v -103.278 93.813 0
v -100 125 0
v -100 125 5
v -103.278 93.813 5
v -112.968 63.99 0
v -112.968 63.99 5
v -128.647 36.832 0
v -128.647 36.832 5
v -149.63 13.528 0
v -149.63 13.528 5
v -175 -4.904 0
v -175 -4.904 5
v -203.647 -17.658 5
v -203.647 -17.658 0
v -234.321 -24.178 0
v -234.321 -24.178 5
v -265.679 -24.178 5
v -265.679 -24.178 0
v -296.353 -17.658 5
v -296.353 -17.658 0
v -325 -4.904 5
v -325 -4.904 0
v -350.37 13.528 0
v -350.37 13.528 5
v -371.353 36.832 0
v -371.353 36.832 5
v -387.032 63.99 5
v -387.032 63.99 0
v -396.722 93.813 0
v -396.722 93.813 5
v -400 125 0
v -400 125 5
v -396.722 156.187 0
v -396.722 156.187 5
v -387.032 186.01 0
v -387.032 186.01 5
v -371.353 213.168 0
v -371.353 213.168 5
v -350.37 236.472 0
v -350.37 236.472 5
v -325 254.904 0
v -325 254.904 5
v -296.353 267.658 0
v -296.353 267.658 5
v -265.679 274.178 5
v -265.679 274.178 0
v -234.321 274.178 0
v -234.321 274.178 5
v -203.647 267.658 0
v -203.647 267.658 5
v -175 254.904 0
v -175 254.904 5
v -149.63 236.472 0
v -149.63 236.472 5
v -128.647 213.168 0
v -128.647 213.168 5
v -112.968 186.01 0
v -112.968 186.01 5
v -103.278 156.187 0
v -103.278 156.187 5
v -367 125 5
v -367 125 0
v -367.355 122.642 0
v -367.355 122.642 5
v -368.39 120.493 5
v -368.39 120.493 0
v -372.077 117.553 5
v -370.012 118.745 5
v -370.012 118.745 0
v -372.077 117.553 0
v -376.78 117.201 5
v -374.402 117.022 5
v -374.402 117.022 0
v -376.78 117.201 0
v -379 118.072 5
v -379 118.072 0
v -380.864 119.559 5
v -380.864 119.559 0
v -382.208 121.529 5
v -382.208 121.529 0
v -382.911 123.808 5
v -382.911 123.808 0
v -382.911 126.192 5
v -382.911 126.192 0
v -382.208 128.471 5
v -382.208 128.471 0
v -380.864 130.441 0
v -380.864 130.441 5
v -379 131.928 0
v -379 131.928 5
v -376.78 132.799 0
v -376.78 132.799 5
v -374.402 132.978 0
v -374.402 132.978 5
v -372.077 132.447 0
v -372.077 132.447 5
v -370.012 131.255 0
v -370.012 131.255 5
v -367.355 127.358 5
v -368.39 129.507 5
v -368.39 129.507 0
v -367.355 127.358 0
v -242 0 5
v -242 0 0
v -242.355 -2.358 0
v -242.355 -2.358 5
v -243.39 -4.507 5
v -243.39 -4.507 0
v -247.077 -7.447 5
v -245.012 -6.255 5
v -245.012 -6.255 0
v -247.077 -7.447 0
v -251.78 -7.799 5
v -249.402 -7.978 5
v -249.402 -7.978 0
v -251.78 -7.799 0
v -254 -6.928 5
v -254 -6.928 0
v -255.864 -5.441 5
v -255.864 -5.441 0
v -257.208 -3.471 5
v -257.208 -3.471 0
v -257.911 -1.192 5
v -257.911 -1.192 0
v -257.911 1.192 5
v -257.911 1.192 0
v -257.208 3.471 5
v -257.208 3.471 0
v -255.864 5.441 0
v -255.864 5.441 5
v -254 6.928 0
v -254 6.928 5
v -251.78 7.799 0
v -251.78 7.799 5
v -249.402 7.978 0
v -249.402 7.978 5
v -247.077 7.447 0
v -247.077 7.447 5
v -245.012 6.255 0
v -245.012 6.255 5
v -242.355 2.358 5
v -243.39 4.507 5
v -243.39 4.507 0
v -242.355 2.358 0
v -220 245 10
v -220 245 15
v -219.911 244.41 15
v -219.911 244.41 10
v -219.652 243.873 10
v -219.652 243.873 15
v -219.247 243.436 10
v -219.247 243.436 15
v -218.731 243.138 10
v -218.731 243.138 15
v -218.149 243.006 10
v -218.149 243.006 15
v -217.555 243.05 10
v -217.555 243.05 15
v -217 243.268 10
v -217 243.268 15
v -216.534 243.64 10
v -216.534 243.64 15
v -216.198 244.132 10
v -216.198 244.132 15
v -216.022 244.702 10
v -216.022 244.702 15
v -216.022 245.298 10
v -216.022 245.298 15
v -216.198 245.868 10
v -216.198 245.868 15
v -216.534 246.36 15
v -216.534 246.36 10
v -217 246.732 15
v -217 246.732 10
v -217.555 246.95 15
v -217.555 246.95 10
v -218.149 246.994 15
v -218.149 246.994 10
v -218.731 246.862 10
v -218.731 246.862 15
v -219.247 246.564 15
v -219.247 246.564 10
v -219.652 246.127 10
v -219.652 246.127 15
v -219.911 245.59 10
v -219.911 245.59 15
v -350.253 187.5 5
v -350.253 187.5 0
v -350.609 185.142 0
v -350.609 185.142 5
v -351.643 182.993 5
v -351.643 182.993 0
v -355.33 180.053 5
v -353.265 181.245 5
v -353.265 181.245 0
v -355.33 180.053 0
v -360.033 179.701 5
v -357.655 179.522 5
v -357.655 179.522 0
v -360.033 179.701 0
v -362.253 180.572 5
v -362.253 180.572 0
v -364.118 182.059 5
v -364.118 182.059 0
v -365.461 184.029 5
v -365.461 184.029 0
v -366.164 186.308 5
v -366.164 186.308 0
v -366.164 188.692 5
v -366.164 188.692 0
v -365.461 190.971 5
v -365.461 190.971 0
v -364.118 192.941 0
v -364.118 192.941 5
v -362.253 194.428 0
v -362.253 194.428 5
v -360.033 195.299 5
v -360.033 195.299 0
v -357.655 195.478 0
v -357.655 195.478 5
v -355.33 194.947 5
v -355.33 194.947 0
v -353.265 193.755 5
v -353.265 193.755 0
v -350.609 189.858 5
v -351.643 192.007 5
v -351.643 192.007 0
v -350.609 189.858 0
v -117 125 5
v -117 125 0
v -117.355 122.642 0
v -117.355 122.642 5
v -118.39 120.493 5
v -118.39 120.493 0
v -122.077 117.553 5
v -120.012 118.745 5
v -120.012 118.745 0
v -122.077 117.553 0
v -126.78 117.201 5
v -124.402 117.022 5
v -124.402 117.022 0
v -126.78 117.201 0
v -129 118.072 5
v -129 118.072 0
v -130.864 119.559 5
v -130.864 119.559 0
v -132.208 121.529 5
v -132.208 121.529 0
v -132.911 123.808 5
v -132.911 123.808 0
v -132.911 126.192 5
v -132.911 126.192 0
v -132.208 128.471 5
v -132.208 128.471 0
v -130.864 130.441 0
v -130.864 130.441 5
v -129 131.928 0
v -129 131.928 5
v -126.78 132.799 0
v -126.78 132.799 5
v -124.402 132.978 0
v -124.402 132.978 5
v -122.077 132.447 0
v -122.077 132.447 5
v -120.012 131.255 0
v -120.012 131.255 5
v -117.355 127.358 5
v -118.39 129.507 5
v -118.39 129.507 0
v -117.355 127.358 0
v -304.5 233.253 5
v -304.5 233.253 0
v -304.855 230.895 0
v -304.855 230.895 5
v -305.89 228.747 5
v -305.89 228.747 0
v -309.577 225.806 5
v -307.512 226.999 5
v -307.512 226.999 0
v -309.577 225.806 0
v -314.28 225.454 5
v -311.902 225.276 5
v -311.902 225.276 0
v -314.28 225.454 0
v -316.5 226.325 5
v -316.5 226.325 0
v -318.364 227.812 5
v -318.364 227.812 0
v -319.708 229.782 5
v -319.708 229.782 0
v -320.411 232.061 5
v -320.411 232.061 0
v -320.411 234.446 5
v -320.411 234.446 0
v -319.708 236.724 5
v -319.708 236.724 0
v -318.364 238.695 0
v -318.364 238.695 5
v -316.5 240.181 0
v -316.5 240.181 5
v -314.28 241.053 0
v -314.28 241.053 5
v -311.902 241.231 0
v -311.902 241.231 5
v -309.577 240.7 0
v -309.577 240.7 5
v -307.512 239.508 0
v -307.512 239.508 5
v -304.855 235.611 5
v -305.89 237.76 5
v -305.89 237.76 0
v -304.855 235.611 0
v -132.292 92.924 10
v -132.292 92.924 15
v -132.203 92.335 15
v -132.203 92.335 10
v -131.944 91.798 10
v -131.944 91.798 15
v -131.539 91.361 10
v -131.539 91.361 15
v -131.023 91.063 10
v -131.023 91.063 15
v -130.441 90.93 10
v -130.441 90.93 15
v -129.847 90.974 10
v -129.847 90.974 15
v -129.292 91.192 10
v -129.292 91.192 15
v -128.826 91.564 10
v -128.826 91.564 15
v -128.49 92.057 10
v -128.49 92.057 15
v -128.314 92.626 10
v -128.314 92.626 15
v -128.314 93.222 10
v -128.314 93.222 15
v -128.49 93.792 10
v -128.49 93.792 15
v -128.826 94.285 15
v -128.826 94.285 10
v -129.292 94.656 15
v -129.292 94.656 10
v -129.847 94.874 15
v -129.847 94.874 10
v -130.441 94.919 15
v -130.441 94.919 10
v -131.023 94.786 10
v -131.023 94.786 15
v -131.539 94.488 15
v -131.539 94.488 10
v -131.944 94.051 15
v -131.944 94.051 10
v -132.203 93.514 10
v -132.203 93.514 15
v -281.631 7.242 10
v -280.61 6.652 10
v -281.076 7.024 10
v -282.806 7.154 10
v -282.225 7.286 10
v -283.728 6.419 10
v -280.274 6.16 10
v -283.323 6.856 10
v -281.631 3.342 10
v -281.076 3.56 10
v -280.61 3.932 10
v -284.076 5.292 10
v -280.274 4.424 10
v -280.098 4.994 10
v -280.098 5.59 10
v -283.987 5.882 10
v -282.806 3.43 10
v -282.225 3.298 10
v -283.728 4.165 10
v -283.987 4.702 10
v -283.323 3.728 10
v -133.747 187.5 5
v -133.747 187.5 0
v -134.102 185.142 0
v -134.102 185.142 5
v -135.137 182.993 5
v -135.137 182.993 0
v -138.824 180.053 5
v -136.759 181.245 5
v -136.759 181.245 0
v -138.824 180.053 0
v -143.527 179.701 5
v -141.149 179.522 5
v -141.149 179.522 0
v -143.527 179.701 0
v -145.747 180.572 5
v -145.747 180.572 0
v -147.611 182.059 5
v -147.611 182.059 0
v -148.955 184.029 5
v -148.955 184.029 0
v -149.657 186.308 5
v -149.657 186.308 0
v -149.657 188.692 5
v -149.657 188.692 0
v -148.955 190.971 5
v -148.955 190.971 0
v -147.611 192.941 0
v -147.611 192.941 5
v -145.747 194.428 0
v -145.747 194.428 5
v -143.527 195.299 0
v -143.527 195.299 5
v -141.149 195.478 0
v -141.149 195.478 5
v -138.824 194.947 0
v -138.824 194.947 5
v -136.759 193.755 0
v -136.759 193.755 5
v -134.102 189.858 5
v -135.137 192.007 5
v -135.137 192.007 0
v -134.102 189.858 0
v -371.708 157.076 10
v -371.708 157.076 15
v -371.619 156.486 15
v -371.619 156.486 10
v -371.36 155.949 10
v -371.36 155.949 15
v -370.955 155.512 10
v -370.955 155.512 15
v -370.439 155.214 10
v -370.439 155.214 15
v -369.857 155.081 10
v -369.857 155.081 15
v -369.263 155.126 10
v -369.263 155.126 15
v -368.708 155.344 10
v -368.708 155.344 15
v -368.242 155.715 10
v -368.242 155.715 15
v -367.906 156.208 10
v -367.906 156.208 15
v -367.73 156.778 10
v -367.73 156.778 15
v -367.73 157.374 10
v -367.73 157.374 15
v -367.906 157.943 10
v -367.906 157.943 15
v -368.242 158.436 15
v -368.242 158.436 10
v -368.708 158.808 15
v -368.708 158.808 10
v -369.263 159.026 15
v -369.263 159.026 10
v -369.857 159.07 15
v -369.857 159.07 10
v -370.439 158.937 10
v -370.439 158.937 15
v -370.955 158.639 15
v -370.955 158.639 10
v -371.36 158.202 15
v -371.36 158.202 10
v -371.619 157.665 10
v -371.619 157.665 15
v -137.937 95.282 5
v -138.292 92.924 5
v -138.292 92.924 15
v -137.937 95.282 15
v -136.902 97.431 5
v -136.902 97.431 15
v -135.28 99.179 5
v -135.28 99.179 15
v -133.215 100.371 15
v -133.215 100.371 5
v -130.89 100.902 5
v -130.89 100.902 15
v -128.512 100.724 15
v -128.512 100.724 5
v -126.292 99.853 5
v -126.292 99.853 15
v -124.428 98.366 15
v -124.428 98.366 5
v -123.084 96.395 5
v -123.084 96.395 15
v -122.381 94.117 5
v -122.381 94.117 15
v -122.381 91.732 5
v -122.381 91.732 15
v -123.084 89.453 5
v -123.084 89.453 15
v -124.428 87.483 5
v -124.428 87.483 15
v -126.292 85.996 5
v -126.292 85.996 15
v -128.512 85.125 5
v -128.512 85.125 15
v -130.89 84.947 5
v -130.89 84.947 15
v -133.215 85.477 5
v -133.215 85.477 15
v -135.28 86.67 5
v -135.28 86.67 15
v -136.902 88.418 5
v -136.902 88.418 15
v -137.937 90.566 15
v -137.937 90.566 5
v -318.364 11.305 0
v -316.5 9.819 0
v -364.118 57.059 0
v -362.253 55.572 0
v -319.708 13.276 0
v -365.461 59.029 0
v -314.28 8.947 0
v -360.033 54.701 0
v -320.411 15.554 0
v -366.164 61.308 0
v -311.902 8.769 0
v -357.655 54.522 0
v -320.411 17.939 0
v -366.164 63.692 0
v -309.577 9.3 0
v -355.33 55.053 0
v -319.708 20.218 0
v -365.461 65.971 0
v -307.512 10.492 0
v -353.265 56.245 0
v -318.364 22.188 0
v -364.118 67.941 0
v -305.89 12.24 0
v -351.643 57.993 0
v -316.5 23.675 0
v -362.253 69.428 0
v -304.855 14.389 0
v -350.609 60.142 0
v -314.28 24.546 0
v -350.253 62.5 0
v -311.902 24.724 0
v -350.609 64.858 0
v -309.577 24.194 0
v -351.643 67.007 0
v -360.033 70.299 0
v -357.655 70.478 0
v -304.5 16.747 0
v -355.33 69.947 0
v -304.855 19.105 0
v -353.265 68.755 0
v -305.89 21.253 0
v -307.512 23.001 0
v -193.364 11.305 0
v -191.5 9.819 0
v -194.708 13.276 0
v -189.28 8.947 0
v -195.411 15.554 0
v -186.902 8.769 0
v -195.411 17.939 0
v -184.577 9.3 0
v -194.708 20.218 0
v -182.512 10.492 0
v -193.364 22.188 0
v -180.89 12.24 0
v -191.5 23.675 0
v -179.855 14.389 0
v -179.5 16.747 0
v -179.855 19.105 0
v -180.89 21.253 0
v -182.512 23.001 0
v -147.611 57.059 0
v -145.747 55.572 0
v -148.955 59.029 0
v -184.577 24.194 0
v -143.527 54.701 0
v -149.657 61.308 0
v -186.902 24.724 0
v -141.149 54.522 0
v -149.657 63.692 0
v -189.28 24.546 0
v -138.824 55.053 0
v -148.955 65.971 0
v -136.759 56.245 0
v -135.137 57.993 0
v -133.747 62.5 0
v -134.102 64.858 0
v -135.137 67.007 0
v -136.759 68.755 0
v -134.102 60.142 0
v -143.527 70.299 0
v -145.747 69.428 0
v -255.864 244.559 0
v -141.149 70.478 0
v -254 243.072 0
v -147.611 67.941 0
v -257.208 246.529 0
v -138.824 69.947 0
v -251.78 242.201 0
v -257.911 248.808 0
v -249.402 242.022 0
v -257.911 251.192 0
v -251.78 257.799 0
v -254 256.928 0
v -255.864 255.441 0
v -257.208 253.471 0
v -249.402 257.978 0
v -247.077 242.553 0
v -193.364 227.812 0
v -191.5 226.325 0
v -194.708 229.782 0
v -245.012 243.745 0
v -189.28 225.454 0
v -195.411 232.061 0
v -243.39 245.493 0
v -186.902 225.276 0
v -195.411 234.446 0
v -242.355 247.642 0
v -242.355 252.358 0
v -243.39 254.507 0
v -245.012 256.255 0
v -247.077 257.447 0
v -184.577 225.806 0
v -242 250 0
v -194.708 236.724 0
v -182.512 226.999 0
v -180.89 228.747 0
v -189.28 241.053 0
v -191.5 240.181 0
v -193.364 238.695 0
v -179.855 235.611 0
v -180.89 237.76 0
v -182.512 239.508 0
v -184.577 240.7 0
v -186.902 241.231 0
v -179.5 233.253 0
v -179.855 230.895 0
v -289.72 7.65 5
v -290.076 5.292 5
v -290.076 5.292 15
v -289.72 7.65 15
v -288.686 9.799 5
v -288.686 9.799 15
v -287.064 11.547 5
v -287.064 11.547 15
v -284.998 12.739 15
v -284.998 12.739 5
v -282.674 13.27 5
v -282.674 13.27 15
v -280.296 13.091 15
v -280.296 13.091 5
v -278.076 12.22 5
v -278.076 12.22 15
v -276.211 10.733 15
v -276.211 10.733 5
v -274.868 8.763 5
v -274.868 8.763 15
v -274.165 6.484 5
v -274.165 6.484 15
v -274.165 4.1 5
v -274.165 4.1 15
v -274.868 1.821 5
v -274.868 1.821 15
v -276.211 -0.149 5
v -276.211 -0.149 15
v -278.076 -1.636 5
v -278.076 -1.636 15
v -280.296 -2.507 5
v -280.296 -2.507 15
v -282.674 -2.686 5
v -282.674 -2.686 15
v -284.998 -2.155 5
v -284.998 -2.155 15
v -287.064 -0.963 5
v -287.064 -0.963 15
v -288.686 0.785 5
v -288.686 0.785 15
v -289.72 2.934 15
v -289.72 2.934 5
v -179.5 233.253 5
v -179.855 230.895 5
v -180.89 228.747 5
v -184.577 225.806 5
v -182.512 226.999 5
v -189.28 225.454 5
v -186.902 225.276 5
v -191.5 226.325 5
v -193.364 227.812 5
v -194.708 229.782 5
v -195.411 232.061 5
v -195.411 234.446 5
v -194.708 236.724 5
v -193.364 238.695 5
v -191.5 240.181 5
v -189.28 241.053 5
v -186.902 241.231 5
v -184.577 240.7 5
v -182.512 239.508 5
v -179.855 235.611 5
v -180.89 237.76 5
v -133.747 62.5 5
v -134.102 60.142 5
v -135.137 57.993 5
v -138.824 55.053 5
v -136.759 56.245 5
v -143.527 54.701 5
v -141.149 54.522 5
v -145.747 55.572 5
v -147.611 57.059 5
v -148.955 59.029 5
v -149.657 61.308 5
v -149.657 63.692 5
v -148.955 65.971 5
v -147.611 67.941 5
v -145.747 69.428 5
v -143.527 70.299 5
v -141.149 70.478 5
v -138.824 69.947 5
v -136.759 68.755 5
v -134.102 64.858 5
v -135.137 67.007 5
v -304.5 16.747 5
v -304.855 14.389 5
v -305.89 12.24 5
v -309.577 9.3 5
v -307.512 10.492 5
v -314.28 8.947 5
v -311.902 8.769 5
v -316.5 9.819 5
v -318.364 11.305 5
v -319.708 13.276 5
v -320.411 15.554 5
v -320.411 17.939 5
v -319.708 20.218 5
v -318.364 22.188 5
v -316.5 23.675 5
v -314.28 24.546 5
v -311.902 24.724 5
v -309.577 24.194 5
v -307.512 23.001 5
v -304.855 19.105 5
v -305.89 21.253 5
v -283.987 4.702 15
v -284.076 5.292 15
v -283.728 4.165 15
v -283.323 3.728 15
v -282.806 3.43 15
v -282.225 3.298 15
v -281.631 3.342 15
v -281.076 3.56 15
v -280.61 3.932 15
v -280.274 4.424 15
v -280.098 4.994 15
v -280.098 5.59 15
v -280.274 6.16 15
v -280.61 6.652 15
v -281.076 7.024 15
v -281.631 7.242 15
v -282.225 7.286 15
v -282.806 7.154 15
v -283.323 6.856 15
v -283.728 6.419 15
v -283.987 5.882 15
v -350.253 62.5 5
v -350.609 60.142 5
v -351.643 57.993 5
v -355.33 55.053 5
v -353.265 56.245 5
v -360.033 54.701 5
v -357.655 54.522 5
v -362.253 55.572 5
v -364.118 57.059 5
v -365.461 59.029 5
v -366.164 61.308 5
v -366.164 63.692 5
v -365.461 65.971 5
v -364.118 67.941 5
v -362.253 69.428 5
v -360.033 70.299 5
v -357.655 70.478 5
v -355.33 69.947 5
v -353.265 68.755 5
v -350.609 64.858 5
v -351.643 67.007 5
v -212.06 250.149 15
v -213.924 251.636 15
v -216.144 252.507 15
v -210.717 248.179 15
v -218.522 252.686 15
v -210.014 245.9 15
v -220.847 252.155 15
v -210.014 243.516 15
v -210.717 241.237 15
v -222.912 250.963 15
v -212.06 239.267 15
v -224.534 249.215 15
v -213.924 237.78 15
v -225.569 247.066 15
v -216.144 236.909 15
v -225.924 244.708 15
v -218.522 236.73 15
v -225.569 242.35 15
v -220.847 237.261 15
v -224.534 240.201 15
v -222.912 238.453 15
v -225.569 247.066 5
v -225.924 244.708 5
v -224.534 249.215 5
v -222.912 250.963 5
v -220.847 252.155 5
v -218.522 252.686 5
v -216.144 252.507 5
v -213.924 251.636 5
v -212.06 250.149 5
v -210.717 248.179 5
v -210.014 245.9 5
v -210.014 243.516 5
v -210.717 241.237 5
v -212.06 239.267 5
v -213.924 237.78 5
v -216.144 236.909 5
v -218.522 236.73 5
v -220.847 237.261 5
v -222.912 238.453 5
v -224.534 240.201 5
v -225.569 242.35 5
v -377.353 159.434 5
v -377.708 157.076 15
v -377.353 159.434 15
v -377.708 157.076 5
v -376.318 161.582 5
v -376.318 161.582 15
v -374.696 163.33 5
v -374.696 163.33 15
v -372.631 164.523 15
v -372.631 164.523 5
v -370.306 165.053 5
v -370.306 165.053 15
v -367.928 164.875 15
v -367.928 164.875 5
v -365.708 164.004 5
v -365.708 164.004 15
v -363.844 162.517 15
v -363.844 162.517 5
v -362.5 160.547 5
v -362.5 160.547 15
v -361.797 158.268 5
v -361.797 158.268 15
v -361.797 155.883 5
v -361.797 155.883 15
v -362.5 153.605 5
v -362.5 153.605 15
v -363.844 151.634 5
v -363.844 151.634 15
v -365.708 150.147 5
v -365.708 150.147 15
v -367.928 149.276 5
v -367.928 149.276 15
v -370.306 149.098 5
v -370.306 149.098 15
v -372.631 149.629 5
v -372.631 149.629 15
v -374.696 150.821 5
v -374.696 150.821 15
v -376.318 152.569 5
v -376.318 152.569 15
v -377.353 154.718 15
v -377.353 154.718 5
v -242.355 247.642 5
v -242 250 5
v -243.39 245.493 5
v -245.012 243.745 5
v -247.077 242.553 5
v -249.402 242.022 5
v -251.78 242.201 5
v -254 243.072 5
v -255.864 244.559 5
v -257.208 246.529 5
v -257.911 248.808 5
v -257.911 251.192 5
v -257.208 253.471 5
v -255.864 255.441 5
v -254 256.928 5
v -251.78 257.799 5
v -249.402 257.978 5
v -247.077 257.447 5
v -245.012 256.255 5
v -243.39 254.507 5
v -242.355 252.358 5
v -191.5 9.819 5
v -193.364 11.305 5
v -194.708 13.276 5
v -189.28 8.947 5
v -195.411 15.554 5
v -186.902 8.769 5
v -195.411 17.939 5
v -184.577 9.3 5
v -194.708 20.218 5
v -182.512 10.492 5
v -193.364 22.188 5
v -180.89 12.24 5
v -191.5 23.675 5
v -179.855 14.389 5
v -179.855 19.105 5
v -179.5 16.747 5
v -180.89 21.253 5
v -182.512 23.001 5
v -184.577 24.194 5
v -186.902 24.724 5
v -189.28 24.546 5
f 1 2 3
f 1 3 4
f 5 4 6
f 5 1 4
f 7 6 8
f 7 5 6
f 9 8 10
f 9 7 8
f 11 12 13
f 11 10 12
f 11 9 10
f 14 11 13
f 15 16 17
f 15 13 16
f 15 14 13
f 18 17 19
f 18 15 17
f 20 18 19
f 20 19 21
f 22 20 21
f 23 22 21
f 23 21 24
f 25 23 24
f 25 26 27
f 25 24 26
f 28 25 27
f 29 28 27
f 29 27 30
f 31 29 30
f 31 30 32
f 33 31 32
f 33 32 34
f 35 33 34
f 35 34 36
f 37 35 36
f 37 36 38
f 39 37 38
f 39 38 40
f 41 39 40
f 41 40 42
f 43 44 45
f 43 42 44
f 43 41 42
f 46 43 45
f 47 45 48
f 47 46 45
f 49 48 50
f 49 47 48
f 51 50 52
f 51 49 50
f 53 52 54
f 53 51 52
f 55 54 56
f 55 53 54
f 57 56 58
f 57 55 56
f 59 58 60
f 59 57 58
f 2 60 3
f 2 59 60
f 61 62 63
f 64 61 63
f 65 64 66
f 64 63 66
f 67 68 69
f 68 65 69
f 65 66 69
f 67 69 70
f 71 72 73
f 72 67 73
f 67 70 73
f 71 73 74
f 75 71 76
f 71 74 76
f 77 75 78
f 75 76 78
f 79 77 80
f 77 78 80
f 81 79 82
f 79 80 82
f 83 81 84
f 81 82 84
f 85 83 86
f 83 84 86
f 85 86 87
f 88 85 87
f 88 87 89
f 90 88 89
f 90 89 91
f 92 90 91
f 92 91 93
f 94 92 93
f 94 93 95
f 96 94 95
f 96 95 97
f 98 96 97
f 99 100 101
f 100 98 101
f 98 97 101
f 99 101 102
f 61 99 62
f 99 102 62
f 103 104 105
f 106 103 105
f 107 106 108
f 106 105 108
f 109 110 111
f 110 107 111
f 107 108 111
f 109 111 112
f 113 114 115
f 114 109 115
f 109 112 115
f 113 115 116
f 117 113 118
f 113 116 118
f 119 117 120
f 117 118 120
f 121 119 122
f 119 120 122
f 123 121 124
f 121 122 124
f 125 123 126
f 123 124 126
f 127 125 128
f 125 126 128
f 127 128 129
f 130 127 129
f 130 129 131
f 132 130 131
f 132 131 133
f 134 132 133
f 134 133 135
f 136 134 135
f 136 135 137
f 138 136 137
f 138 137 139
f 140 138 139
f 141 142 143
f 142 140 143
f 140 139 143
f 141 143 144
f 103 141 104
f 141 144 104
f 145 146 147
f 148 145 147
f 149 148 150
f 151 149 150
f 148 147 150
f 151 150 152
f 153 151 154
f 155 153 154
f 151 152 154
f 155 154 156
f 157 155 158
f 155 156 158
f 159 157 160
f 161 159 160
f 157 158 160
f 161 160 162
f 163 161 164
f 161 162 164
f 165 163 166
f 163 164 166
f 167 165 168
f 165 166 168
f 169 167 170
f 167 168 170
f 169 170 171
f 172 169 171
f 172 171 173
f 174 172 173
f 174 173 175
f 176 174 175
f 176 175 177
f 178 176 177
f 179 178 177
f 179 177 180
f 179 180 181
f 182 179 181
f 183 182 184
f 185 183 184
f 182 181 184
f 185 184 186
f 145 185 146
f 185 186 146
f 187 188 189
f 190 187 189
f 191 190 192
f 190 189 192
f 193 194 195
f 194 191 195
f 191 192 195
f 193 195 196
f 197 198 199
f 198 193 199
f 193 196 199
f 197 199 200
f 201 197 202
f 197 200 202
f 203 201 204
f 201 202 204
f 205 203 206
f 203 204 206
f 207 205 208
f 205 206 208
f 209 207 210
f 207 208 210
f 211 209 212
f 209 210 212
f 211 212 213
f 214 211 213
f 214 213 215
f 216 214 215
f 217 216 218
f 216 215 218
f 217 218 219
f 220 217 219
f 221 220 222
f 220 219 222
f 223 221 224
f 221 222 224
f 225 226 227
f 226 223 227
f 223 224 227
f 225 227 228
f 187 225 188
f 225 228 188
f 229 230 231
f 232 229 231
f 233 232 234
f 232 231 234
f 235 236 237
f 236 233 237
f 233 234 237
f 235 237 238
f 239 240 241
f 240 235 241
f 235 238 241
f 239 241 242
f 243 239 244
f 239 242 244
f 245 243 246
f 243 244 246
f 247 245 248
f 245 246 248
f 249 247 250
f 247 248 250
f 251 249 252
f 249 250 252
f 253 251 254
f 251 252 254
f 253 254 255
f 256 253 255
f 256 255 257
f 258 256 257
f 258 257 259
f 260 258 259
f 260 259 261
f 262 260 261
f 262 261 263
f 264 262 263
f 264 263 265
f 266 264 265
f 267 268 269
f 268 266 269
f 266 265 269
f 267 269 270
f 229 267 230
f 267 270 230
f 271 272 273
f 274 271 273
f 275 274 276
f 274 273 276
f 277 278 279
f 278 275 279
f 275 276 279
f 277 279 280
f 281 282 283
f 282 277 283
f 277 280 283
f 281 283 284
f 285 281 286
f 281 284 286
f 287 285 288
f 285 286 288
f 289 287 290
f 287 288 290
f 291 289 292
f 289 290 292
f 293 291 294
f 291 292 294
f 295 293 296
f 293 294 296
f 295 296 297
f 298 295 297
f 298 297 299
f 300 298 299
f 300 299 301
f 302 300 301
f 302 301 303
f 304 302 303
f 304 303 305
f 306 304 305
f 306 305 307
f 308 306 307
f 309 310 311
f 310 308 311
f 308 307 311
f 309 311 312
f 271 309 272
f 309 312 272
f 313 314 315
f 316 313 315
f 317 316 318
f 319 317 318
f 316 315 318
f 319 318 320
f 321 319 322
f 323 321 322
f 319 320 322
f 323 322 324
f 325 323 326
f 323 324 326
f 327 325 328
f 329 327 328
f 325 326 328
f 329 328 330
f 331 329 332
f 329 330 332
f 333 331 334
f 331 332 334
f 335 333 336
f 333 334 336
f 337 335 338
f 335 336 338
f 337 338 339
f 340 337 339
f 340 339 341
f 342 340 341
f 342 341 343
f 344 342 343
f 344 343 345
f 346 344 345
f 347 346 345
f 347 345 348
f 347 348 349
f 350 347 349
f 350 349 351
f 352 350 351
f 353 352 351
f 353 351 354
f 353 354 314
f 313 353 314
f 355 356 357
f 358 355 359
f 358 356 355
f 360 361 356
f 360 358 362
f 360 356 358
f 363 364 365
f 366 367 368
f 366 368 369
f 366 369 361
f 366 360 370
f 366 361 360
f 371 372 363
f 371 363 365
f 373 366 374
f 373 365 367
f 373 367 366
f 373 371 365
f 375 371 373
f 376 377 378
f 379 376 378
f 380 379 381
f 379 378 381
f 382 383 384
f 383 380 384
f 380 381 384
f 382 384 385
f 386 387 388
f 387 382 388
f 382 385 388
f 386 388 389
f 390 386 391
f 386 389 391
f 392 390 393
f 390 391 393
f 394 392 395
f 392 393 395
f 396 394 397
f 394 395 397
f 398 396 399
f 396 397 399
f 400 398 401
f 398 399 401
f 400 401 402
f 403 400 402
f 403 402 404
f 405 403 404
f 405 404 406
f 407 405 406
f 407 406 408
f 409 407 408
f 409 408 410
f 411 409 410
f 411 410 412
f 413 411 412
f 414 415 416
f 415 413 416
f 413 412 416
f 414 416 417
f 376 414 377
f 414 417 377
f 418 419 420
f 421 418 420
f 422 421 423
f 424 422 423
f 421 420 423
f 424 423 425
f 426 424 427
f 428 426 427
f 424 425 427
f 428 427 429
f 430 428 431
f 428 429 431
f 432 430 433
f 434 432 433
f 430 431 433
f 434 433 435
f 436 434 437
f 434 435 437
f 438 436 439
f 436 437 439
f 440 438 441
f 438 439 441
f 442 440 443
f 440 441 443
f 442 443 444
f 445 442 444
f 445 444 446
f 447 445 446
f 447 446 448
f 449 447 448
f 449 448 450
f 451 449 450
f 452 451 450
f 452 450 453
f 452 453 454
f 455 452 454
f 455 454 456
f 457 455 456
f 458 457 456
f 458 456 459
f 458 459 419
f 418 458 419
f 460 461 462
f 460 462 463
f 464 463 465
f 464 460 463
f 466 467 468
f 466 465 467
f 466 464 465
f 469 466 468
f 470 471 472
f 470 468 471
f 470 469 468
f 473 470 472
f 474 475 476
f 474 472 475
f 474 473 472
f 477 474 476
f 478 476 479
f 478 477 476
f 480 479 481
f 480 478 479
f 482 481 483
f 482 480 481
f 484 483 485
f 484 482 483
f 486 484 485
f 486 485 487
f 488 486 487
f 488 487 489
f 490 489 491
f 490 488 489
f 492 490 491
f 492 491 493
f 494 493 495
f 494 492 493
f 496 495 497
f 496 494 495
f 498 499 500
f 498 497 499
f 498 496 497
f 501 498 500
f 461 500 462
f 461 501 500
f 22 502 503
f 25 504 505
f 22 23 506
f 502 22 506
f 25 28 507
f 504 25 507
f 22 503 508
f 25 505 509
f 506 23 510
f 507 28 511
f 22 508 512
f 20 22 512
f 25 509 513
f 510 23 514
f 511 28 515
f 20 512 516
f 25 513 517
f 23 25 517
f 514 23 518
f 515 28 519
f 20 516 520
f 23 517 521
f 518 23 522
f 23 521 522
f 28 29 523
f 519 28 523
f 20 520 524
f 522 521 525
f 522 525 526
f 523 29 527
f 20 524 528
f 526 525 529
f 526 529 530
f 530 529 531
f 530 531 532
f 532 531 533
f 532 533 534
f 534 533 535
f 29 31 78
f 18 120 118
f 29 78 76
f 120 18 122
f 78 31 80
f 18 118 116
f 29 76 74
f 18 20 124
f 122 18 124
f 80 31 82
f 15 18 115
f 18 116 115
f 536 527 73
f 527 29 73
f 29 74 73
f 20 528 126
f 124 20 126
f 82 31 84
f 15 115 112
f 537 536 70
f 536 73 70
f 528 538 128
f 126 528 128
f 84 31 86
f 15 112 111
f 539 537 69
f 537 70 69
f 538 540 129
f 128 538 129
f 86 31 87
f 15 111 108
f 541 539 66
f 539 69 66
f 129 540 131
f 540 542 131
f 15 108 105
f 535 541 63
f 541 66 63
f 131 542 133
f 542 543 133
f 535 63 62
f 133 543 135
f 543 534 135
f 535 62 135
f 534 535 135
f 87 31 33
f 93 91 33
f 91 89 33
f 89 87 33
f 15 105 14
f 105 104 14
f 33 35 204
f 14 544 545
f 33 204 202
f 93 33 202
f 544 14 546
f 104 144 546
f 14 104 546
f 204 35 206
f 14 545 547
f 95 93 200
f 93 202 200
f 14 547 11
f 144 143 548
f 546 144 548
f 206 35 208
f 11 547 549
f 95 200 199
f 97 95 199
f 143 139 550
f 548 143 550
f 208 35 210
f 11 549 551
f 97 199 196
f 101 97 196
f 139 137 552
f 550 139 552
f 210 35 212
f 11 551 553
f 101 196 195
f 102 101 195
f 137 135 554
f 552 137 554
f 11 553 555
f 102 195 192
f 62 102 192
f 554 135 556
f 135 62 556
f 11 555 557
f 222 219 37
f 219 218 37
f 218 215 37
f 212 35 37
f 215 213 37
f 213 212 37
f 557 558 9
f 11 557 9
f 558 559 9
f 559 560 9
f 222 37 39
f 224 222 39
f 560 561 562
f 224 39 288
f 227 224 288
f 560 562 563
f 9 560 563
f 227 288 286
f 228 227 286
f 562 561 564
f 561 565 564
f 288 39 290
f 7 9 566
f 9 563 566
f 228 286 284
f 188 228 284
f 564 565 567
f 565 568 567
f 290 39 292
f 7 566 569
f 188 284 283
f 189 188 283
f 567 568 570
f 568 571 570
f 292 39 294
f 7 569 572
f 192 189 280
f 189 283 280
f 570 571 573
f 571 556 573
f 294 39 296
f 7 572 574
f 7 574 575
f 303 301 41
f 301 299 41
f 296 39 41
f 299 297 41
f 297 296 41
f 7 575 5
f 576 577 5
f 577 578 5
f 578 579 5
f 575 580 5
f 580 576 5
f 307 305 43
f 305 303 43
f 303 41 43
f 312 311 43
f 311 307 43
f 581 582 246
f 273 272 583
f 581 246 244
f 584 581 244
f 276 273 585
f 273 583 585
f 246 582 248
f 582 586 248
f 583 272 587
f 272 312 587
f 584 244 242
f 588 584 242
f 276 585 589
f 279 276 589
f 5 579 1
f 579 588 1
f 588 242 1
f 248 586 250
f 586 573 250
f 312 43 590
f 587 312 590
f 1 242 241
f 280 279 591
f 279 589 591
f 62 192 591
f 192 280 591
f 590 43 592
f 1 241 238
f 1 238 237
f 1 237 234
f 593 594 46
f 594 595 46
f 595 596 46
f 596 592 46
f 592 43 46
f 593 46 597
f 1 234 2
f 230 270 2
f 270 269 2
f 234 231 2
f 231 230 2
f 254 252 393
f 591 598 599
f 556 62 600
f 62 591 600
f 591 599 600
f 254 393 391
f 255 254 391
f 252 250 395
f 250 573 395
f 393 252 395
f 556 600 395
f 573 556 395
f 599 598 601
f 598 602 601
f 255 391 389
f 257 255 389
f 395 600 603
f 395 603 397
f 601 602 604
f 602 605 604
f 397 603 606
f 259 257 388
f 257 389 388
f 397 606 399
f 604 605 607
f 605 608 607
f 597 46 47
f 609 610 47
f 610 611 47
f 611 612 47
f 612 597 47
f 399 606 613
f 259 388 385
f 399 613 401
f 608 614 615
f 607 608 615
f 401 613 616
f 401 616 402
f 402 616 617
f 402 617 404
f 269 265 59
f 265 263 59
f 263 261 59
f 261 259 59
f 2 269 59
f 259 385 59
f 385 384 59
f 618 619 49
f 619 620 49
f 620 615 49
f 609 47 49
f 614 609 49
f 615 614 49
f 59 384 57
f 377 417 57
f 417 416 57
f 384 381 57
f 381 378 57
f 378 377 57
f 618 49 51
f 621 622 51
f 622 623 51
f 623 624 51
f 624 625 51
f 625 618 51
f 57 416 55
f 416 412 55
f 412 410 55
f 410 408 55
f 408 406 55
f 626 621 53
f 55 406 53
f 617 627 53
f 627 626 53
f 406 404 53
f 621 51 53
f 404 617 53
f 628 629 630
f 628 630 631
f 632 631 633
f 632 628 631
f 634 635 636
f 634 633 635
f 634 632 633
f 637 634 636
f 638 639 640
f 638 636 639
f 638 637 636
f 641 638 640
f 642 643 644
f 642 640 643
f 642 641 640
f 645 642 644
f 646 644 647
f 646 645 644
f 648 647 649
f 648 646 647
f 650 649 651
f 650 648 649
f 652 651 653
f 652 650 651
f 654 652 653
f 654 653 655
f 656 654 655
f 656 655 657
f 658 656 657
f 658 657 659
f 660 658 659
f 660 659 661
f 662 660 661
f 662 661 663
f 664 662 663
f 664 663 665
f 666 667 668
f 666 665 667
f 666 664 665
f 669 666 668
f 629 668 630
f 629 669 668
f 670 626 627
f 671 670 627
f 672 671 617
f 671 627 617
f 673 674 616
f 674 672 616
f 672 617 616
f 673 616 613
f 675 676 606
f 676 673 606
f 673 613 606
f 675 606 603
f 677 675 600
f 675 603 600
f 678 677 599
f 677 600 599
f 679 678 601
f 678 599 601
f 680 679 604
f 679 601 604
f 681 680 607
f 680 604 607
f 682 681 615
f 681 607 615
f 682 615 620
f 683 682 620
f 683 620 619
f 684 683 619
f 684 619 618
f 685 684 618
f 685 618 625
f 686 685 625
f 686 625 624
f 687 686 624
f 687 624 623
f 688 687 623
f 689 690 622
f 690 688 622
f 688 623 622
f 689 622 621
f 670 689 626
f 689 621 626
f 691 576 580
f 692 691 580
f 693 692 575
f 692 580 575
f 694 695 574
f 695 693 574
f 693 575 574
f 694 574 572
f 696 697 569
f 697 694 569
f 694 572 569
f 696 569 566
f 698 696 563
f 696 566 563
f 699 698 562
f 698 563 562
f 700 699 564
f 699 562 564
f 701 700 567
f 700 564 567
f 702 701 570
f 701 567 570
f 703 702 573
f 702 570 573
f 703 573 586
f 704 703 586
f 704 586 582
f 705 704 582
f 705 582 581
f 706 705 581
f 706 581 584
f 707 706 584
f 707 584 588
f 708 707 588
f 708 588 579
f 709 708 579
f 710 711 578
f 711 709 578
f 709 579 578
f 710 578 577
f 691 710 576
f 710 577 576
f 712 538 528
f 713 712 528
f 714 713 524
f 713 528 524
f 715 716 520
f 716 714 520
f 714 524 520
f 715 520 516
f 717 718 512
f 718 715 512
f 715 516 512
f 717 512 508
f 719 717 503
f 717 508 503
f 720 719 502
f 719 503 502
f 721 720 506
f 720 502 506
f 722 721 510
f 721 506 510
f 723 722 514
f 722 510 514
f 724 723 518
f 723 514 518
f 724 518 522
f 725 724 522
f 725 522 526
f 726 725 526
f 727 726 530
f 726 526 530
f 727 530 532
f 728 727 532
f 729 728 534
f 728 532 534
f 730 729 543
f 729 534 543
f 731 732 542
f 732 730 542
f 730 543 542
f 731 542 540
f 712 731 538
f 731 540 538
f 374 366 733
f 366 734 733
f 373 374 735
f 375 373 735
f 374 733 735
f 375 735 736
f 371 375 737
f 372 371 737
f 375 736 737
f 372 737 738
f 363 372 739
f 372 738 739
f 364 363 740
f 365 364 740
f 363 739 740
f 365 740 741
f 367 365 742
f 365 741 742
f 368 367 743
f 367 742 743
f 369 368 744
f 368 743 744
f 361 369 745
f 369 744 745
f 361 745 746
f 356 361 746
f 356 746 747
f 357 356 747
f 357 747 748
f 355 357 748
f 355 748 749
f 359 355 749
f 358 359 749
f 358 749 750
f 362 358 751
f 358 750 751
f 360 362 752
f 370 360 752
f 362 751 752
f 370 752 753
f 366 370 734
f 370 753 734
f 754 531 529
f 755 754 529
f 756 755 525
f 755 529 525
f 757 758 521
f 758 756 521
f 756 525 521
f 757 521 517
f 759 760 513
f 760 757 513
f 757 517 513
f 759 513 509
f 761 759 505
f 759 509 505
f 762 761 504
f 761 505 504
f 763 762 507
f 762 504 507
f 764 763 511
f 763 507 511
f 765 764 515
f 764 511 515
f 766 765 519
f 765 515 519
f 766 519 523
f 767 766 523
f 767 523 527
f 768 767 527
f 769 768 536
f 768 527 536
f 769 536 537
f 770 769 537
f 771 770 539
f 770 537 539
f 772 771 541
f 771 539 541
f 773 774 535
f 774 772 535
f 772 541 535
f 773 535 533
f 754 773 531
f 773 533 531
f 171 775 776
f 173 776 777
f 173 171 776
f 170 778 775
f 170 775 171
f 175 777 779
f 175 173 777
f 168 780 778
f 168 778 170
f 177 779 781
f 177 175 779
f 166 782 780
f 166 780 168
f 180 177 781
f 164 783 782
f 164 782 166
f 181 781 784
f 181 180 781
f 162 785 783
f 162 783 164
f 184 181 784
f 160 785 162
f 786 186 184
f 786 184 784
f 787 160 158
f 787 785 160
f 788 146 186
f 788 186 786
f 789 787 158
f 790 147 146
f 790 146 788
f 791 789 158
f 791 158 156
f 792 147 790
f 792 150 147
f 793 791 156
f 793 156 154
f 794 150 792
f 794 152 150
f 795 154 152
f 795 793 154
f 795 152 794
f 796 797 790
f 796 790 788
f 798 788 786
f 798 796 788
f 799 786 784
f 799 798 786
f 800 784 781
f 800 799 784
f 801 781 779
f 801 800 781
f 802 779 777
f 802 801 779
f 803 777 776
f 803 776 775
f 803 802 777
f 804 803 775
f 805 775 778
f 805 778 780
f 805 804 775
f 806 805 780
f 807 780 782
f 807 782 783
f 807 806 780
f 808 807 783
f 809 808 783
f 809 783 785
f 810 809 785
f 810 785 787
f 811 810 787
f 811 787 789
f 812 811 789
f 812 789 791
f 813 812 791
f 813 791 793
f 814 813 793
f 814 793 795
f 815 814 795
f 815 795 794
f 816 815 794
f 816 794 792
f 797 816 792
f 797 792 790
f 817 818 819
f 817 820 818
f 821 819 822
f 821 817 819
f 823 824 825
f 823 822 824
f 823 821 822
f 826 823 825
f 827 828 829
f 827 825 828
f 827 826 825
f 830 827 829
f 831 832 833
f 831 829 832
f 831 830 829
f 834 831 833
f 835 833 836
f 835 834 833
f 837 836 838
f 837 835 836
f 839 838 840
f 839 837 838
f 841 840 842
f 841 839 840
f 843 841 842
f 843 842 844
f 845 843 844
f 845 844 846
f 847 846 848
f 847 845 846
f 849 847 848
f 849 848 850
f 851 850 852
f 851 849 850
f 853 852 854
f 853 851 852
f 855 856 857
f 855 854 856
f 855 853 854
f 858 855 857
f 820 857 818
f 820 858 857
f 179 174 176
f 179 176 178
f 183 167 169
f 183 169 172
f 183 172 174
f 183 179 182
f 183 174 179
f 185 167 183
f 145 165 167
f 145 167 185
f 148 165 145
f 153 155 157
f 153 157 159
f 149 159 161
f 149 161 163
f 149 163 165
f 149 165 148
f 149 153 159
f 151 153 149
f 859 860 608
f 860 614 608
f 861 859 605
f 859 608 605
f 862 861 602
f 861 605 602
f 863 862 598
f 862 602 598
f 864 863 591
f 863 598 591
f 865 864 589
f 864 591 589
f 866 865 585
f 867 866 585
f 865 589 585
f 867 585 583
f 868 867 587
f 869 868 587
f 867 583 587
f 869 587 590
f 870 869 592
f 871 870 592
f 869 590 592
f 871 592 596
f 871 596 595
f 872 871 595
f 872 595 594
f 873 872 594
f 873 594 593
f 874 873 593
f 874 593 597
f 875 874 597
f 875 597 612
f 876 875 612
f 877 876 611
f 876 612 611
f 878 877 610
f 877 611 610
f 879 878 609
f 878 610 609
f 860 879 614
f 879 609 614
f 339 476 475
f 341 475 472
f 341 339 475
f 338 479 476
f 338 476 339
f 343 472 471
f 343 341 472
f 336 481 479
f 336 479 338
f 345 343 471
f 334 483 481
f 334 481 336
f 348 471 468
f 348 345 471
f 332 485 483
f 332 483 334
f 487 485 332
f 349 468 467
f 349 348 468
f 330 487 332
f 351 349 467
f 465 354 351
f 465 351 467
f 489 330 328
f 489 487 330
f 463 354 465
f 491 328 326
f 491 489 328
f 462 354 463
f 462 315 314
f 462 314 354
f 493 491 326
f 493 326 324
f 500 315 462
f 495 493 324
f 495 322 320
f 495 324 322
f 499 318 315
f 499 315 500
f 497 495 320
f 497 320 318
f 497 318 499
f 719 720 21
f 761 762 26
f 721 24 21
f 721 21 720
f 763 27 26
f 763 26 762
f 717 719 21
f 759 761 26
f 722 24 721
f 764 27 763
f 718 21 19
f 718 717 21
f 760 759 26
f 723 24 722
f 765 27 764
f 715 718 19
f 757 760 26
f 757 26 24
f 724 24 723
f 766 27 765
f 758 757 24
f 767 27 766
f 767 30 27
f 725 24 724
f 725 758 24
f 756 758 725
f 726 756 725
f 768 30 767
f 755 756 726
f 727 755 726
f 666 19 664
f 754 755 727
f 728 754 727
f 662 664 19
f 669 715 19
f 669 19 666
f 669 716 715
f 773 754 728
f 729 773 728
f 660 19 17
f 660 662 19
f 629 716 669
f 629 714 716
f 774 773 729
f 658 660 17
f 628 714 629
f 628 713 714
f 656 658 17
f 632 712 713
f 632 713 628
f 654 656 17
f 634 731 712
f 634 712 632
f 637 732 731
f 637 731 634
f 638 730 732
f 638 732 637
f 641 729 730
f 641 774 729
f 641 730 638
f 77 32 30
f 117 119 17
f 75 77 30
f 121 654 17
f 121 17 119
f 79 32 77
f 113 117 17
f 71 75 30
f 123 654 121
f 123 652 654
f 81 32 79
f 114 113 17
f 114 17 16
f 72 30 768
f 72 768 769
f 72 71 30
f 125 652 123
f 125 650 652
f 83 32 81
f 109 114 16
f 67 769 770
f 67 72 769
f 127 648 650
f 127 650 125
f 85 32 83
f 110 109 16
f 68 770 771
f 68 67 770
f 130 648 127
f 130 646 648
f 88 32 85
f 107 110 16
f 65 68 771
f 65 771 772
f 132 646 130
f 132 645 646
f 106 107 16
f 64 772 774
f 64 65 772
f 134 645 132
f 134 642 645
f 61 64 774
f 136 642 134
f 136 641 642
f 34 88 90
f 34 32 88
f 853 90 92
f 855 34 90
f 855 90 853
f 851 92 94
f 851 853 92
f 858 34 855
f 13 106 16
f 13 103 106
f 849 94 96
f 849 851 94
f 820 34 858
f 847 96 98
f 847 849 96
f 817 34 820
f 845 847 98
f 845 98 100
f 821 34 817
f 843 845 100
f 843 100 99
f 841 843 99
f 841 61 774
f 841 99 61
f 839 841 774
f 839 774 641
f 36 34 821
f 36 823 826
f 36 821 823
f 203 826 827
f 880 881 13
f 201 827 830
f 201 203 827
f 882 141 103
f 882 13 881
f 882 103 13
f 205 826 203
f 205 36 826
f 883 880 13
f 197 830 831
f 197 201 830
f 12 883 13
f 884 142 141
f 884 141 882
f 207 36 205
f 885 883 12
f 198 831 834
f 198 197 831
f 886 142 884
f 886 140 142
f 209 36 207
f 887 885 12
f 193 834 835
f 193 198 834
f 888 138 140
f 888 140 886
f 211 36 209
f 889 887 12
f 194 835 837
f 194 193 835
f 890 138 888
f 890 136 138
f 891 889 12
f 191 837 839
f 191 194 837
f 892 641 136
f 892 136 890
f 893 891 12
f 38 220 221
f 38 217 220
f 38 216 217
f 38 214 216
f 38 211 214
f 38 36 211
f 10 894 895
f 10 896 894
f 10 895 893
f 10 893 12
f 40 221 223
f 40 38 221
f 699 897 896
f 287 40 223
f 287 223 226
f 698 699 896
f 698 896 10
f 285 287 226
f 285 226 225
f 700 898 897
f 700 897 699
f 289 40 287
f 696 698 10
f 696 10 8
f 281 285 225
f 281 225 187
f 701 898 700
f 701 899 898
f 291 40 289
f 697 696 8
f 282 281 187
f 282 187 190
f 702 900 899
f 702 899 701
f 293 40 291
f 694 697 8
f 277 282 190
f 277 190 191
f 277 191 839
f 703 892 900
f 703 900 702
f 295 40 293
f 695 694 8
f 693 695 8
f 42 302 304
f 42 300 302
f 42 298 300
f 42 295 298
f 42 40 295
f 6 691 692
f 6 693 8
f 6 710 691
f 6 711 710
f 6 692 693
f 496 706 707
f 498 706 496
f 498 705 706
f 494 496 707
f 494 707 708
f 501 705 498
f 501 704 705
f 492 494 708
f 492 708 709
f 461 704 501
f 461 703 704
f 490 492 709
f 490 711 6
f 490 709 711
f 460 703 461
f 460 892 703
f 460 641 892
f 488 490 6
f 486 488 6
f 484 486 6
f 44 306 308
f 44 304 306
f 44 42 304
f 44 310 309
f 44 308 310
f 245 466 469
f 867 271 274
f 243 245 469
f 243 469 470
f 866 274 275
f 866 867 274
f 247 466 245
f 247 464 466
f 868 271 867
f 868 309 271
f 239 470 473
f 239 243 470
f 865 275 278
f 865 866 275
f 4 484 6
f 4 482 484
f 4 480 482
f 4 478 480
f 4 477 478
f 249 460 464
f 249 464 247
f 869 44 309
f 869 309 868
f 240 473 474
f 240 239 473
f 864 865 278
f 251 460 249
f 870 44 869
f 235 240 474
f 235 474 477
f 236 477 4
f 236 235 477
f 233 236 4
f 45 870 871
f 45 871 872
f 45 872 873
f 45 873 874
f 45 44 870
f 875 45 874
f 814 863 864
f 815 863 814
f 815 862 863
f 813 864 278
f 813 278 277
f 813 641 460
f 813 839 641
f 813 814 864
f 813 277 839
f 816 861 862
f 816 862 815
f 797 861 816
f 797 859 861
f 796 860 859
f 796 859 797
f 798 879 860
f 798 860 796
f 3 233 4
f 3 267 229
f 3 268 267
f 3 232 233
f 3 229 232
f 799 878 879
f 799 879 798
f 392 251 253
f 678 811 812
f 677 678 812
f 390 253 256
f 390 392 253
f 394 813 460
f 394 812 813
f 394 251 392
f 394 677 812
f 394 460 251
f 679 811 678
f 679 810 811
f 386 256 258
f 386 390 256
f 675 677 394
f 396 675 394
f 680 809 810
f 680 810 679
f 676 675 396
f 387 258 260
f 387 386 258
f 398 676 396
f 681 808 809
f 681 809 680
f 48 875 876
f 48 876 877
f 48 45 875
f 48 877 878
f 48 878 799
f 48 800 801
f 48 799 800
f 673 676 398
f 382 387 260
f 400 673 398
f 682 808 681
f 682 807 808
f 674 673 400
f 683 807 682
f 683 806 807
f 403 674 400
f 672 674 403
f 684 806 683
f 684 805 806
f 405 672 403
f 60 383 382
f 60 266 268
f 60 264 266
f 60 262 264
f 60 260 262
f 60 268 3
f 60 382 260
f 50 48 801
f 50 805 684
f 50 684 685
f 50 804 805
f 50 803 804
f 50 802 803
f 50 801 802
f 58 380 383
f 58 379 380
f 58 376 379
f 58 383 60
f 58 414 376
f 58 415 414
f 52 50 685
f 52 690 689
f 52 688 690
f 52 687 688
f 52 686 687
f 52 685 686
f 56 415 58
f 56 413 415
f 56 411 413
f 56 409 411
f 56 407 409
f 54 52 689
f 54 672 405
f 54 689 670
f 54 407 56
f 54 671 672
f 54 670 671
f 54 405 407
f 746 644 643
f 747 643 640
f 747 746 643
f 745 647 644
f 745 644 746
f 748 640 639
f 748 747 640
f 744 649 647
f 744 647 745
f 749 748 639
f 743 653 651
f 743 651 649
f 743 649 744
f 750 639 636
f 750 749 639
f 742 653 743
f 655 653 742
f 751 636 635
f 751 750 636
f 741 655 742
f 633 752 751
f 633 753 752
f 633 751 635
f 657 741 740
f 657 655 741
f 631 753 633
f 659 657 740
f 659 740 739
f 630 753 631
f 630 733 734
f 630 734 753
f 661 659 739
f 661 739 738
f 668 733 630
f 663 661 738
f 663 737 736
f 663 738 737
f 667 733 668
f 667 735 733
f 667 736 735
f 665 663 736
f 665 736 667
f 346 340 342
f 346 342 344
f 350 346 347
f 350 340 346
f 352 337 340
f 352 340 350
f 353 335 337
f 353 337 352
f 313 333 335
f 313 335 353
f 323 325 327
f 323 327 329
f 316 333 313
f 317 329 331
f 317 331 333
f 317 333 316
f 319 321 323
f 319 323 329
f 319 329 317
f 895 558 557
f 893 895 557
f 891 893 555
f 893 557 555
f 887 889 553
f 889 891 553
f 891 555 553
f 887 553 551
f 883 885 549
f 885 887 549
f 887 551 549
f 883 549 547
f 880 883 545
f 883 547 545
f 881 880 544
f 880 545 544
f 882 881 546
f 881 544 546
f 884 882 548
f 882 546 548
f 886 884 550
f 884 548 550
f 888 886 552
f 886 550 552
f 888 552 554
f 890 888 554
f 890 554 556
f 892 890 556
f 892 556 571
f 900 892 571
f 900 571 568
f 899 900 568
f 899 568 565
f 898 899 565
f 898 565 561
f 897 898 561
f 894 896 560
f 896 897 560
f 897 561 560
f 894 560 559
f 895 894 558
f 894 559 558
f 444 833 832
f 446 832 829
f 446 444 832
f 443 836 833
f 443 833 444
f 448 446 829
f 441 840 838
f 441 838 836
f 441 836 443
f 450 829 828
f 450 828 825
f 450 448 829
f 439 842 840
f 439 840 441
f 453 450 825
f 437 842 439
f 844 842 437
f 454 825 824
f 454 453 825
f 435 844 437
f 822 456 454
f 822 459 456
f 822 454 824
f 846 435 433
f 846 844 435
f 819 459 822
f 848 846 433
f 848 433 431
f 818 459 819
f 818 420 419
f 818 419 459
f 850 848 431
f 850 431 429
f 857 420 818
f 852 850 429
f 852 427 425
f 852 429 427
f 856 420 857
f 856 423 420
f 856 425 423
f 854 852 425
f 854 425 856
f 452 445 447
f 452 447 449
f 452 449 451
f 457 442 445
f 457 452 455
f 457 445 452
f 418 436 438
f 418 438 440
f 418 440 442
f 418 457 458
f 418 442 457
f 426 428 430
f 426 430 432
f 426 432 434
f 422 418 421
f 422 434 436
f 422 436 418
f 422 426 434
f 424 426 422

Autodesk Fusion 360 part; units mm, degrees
sketch "Sketch5" plane through (0, 0, 0) normal (0, 0, 1) x (1, 0, 0)
  circle A0 centre (-250, 125) radius 150
  line L0 (-250, 125) -> (-250, 250)
  circle A1 centre (-250, 250) radius 8
  circle A2 centre (-312.5, 233.2532) radius 8
  circle A3 centre (-358.2532, 187.5) radius 8
  circle A4 centre (-375, 125) radius 8
  circle A5 centre (-358.2532, 62.5) radius 8
  circle A6 centre (-312.5, 16.7468) radius 8
  circle A7 centre (-250, 0) radius 8
  circle A8 centre (-187.5, 16.7468) radius 8
  circle A9 centre (-141.7468, 62.5) radius 8
  circle A10 centre (-125, 125) radius 8
  circle A11 centre (-141.7468, 187.5) radius 8
  circle A12 centre (-187.5, 233.2532) radius 8
  dimension "d20" = 300
  dimension "d21" = 16
  dimension "d23" = 360
extrude "Extrude4" add sketch "Sketch5" along normal blind 5 makes body 1
sketch "Sketch6" plane through (0, 0, 5) normal (0, 0, 1) x (-1, 0, 0)
  circle A0 centre (125, -125) radius 8
  circle A1 centre (187.5, -233.2532) radius 8
  circle A2 centre (250, -125) radius 150
  circle A3 centre (250, -250) radius 8
  circle A4 centre (375, -125) radius 8
  circle A5 centre (312.5, -233.2532) radius 8
  circle A6 centre (250, 0) radius 8
  circle A7 centre (141.7468, -62.5) radius 8
  circle A8 centre (358.2532, -187.5) radius 8
  circle A9 centre (141.7468, -187.5) radius 8
  circle A10 centre (312.5, -16.7468) radius 8
  circle A11 centre (358.2532, -62.5) radius 8
  circle A12 centre (187.5, -16.7468) radius 8
  arc A13 (187.5, -233.2532) -> (250, -250) centre (260.797, -84.705) ccw
  circle A14 centre (217.9243, -244.708) radius 8
  circle A15 centre (369.708, -157.0757) radius 8
  circle A16 centre (282.0757, -5.292) radius 8
  circle A17 centre (130.292, -92.9243) radius 8
  dimension "d26" = 16
  dimension "d28" = 360
extrude "Extrude5" add sketch "Sketch6" along normal blind 10 contours A13 A14 | A13 A14 | A15 | A16 | A17 bodies 1
sketch "Sketch7" plane through (0, 0, 15) normal (0, 0, 1) x (-1, 0, 0)
  circle A0 centre (282.0757, -5.292) radius 8
  circle A1 centre (282.0757, -5.292) radius 2
  dimension "d31" = 4
sketch "Sketch8" plane through (0, 0, 0) normal (0, 0, 1) x (1, 0, 0)
sketch "Sketch9" plane through (0, 0, 15) normal (0, 0, 1) x (-1, 0, 0)
  circle A0 centre (130.292, -92.9243) radius 8
  circle A1 centre (130.292, -92.9243) radius 2
  dimension "d32" = 4
sketch "Sketch10" plane through (0, 0, 15) normal (0, 0, 1) x (-1, 0, 0)
  circle A0 centre (217.9243, -244.708) radius 8
  circle A1 centre (218, -245) radius 2
  dimension "d33" = 4
sketch "Sketch11" plane through (0, 0, 15) normal (0, 0, 1) x (-1, 0, 0)
  circle A0 centre (369.708, -157.0757) radius 8
  circle A1 centre (369.708, -157.0757) radius 2
  dimension "d34" = 4
extrude "Extrude6" cut sketch "Sketch11" sketch "Sketch10" sketch "Sketch9" sketch "Sketch7" against normal blind 5 contours A1 of sketch 2 contours A1 of sketch 3 contours A1 of sketch 4 contours A1 bodies 1
thread "Thread2" "ISO Metric profile 4.0 M4x0.7 M4x0.7 6H" major diameter 4.1095 minor diameter 3.332 pitch 0.7 angle 60 resizes the face on face at (-282.9881, 3.5123, 11.6667) on face at (-131.6154, 91.4248, 11.6667) on face at (-219.9382, 244.5065, 11.6667) on face at (-371.4644, 158.0322, 11.6667) on bodies 1
copy_body "Body->Comp1" bodies 1 removing the originals makes body 2 in component "Component"
sketch "Sketch1" plane through (0, 0, 0) normal (0, 0, 1) x (1, 0, 0)
sketch "Sketch2" plane through (0, 0, 0) normal (1, 0, 0) x (0, 1, 0)
  circle A0 centre (-250, 250) radius 150
  line L0 (-250, 250) -> (-250, 375)
  circle A1 centre (-250, 375) radius 8
  circle A2 centre (-312.5, 358.2532) radius 8
  circle A3 centre (-358.2532, 312.5) radius 8
  circle A4 centre (-375, 250) radius 8
  circle A5 centre (-358.2532, 187.5) radius 8
  circle A6 centre (-312.5, 141.7468) radius 8
  circle A7 centre (-250, 125) radius 8
  circle A8 centre (-187.5, 141.7468) radius 8
  circle A9 centre (-141.7468, 187.5) radius 8
  circle A10 centre (-125, 250) radius 8
  circle A11 centre (-141.7468, 312.5) radius 8
  circle A12 centre (-187.5, 358.2532) radius 8
  line L1 (-250, 375) -> (-187.5, 358.2532)
  line L2 (-250, 375) -> (-218.75, 366.6266)
  circle A13 centre (-220.2756, 367.0354) radius 8
  dimension "d1" = 300
  dimension "d2" = 16
  dimension "d4" = 360
  dimension "d5" = 16
extrude "Extrude1" [suppressed]
sketch "Sketch3" plane through (5, 0, 0) normal (1, 0, 0) x (0, 1, 0)
  circle A0 centre (-141.7468, 187.5) radius 8
  circle A1 centre (-250, 125) radius 8
  circle A2 centre (-250, 250) radius 150
  circle A3 centre (-187.5, 358.2532) radius 8
  circle A4 centre (-250, 375) radius 8
  circle A5 centre (-358.2532, 312.5) radius 8
  circle A6 centre (-312.5, 358.2532) radius 8
  circle A7 centre (-375, 250) radius 8
  circle A8 centre (-358.2532, 187.5) radius 8
  circle A9 centre (-187.5, 141.7468) radius 8
  circle A10 centre (-312.5, 141.7468) radius 8
  circle A11 centre (-141.7468, 312.5) radius 8
  circle A12 centre (-125, 250) radius 8
  line L0 (-250, 375) -> (-187.5, 358.2532)
  circle A13 centre (-218.75, 366.6266) radius 8
  circle A14 centre (-366.6266, 281.25) radius 8
  circle A15 centre (-281.25, 133.3734) radius 8
  circle A16 centre (-133.3734, 218.75) radius 8
  dimension "d8" = 16
  dimension "d10" = 360
extrude "Extrude2" [suppressed]
sketch "Sketch4" plane through (15, 0, 0) normal (1, 0, 0) x (0, 1, 0)
  circle A0 centre (-281.25, 133.3734) radius 8
  circle A1 centre (-281.25, 133.3734) radius 2
  circle A2 centre (-367, 281) radius 2
  circle A3 centre (-218.6865, 366.4726) radius 2
  circle A4 centre (-133.5814, 218.3266) radius 2
  dimension "d13" = 4
  dimension "d14" = 4
  dimension "d15" = 4
extrude "Extrude3" [suppressed]
thread "Thread1" [suppressed]
component "Component" placed x (1, 0, 0) y (0, 1, 0) z (0, 0, 1) at (0, 0, 0)
